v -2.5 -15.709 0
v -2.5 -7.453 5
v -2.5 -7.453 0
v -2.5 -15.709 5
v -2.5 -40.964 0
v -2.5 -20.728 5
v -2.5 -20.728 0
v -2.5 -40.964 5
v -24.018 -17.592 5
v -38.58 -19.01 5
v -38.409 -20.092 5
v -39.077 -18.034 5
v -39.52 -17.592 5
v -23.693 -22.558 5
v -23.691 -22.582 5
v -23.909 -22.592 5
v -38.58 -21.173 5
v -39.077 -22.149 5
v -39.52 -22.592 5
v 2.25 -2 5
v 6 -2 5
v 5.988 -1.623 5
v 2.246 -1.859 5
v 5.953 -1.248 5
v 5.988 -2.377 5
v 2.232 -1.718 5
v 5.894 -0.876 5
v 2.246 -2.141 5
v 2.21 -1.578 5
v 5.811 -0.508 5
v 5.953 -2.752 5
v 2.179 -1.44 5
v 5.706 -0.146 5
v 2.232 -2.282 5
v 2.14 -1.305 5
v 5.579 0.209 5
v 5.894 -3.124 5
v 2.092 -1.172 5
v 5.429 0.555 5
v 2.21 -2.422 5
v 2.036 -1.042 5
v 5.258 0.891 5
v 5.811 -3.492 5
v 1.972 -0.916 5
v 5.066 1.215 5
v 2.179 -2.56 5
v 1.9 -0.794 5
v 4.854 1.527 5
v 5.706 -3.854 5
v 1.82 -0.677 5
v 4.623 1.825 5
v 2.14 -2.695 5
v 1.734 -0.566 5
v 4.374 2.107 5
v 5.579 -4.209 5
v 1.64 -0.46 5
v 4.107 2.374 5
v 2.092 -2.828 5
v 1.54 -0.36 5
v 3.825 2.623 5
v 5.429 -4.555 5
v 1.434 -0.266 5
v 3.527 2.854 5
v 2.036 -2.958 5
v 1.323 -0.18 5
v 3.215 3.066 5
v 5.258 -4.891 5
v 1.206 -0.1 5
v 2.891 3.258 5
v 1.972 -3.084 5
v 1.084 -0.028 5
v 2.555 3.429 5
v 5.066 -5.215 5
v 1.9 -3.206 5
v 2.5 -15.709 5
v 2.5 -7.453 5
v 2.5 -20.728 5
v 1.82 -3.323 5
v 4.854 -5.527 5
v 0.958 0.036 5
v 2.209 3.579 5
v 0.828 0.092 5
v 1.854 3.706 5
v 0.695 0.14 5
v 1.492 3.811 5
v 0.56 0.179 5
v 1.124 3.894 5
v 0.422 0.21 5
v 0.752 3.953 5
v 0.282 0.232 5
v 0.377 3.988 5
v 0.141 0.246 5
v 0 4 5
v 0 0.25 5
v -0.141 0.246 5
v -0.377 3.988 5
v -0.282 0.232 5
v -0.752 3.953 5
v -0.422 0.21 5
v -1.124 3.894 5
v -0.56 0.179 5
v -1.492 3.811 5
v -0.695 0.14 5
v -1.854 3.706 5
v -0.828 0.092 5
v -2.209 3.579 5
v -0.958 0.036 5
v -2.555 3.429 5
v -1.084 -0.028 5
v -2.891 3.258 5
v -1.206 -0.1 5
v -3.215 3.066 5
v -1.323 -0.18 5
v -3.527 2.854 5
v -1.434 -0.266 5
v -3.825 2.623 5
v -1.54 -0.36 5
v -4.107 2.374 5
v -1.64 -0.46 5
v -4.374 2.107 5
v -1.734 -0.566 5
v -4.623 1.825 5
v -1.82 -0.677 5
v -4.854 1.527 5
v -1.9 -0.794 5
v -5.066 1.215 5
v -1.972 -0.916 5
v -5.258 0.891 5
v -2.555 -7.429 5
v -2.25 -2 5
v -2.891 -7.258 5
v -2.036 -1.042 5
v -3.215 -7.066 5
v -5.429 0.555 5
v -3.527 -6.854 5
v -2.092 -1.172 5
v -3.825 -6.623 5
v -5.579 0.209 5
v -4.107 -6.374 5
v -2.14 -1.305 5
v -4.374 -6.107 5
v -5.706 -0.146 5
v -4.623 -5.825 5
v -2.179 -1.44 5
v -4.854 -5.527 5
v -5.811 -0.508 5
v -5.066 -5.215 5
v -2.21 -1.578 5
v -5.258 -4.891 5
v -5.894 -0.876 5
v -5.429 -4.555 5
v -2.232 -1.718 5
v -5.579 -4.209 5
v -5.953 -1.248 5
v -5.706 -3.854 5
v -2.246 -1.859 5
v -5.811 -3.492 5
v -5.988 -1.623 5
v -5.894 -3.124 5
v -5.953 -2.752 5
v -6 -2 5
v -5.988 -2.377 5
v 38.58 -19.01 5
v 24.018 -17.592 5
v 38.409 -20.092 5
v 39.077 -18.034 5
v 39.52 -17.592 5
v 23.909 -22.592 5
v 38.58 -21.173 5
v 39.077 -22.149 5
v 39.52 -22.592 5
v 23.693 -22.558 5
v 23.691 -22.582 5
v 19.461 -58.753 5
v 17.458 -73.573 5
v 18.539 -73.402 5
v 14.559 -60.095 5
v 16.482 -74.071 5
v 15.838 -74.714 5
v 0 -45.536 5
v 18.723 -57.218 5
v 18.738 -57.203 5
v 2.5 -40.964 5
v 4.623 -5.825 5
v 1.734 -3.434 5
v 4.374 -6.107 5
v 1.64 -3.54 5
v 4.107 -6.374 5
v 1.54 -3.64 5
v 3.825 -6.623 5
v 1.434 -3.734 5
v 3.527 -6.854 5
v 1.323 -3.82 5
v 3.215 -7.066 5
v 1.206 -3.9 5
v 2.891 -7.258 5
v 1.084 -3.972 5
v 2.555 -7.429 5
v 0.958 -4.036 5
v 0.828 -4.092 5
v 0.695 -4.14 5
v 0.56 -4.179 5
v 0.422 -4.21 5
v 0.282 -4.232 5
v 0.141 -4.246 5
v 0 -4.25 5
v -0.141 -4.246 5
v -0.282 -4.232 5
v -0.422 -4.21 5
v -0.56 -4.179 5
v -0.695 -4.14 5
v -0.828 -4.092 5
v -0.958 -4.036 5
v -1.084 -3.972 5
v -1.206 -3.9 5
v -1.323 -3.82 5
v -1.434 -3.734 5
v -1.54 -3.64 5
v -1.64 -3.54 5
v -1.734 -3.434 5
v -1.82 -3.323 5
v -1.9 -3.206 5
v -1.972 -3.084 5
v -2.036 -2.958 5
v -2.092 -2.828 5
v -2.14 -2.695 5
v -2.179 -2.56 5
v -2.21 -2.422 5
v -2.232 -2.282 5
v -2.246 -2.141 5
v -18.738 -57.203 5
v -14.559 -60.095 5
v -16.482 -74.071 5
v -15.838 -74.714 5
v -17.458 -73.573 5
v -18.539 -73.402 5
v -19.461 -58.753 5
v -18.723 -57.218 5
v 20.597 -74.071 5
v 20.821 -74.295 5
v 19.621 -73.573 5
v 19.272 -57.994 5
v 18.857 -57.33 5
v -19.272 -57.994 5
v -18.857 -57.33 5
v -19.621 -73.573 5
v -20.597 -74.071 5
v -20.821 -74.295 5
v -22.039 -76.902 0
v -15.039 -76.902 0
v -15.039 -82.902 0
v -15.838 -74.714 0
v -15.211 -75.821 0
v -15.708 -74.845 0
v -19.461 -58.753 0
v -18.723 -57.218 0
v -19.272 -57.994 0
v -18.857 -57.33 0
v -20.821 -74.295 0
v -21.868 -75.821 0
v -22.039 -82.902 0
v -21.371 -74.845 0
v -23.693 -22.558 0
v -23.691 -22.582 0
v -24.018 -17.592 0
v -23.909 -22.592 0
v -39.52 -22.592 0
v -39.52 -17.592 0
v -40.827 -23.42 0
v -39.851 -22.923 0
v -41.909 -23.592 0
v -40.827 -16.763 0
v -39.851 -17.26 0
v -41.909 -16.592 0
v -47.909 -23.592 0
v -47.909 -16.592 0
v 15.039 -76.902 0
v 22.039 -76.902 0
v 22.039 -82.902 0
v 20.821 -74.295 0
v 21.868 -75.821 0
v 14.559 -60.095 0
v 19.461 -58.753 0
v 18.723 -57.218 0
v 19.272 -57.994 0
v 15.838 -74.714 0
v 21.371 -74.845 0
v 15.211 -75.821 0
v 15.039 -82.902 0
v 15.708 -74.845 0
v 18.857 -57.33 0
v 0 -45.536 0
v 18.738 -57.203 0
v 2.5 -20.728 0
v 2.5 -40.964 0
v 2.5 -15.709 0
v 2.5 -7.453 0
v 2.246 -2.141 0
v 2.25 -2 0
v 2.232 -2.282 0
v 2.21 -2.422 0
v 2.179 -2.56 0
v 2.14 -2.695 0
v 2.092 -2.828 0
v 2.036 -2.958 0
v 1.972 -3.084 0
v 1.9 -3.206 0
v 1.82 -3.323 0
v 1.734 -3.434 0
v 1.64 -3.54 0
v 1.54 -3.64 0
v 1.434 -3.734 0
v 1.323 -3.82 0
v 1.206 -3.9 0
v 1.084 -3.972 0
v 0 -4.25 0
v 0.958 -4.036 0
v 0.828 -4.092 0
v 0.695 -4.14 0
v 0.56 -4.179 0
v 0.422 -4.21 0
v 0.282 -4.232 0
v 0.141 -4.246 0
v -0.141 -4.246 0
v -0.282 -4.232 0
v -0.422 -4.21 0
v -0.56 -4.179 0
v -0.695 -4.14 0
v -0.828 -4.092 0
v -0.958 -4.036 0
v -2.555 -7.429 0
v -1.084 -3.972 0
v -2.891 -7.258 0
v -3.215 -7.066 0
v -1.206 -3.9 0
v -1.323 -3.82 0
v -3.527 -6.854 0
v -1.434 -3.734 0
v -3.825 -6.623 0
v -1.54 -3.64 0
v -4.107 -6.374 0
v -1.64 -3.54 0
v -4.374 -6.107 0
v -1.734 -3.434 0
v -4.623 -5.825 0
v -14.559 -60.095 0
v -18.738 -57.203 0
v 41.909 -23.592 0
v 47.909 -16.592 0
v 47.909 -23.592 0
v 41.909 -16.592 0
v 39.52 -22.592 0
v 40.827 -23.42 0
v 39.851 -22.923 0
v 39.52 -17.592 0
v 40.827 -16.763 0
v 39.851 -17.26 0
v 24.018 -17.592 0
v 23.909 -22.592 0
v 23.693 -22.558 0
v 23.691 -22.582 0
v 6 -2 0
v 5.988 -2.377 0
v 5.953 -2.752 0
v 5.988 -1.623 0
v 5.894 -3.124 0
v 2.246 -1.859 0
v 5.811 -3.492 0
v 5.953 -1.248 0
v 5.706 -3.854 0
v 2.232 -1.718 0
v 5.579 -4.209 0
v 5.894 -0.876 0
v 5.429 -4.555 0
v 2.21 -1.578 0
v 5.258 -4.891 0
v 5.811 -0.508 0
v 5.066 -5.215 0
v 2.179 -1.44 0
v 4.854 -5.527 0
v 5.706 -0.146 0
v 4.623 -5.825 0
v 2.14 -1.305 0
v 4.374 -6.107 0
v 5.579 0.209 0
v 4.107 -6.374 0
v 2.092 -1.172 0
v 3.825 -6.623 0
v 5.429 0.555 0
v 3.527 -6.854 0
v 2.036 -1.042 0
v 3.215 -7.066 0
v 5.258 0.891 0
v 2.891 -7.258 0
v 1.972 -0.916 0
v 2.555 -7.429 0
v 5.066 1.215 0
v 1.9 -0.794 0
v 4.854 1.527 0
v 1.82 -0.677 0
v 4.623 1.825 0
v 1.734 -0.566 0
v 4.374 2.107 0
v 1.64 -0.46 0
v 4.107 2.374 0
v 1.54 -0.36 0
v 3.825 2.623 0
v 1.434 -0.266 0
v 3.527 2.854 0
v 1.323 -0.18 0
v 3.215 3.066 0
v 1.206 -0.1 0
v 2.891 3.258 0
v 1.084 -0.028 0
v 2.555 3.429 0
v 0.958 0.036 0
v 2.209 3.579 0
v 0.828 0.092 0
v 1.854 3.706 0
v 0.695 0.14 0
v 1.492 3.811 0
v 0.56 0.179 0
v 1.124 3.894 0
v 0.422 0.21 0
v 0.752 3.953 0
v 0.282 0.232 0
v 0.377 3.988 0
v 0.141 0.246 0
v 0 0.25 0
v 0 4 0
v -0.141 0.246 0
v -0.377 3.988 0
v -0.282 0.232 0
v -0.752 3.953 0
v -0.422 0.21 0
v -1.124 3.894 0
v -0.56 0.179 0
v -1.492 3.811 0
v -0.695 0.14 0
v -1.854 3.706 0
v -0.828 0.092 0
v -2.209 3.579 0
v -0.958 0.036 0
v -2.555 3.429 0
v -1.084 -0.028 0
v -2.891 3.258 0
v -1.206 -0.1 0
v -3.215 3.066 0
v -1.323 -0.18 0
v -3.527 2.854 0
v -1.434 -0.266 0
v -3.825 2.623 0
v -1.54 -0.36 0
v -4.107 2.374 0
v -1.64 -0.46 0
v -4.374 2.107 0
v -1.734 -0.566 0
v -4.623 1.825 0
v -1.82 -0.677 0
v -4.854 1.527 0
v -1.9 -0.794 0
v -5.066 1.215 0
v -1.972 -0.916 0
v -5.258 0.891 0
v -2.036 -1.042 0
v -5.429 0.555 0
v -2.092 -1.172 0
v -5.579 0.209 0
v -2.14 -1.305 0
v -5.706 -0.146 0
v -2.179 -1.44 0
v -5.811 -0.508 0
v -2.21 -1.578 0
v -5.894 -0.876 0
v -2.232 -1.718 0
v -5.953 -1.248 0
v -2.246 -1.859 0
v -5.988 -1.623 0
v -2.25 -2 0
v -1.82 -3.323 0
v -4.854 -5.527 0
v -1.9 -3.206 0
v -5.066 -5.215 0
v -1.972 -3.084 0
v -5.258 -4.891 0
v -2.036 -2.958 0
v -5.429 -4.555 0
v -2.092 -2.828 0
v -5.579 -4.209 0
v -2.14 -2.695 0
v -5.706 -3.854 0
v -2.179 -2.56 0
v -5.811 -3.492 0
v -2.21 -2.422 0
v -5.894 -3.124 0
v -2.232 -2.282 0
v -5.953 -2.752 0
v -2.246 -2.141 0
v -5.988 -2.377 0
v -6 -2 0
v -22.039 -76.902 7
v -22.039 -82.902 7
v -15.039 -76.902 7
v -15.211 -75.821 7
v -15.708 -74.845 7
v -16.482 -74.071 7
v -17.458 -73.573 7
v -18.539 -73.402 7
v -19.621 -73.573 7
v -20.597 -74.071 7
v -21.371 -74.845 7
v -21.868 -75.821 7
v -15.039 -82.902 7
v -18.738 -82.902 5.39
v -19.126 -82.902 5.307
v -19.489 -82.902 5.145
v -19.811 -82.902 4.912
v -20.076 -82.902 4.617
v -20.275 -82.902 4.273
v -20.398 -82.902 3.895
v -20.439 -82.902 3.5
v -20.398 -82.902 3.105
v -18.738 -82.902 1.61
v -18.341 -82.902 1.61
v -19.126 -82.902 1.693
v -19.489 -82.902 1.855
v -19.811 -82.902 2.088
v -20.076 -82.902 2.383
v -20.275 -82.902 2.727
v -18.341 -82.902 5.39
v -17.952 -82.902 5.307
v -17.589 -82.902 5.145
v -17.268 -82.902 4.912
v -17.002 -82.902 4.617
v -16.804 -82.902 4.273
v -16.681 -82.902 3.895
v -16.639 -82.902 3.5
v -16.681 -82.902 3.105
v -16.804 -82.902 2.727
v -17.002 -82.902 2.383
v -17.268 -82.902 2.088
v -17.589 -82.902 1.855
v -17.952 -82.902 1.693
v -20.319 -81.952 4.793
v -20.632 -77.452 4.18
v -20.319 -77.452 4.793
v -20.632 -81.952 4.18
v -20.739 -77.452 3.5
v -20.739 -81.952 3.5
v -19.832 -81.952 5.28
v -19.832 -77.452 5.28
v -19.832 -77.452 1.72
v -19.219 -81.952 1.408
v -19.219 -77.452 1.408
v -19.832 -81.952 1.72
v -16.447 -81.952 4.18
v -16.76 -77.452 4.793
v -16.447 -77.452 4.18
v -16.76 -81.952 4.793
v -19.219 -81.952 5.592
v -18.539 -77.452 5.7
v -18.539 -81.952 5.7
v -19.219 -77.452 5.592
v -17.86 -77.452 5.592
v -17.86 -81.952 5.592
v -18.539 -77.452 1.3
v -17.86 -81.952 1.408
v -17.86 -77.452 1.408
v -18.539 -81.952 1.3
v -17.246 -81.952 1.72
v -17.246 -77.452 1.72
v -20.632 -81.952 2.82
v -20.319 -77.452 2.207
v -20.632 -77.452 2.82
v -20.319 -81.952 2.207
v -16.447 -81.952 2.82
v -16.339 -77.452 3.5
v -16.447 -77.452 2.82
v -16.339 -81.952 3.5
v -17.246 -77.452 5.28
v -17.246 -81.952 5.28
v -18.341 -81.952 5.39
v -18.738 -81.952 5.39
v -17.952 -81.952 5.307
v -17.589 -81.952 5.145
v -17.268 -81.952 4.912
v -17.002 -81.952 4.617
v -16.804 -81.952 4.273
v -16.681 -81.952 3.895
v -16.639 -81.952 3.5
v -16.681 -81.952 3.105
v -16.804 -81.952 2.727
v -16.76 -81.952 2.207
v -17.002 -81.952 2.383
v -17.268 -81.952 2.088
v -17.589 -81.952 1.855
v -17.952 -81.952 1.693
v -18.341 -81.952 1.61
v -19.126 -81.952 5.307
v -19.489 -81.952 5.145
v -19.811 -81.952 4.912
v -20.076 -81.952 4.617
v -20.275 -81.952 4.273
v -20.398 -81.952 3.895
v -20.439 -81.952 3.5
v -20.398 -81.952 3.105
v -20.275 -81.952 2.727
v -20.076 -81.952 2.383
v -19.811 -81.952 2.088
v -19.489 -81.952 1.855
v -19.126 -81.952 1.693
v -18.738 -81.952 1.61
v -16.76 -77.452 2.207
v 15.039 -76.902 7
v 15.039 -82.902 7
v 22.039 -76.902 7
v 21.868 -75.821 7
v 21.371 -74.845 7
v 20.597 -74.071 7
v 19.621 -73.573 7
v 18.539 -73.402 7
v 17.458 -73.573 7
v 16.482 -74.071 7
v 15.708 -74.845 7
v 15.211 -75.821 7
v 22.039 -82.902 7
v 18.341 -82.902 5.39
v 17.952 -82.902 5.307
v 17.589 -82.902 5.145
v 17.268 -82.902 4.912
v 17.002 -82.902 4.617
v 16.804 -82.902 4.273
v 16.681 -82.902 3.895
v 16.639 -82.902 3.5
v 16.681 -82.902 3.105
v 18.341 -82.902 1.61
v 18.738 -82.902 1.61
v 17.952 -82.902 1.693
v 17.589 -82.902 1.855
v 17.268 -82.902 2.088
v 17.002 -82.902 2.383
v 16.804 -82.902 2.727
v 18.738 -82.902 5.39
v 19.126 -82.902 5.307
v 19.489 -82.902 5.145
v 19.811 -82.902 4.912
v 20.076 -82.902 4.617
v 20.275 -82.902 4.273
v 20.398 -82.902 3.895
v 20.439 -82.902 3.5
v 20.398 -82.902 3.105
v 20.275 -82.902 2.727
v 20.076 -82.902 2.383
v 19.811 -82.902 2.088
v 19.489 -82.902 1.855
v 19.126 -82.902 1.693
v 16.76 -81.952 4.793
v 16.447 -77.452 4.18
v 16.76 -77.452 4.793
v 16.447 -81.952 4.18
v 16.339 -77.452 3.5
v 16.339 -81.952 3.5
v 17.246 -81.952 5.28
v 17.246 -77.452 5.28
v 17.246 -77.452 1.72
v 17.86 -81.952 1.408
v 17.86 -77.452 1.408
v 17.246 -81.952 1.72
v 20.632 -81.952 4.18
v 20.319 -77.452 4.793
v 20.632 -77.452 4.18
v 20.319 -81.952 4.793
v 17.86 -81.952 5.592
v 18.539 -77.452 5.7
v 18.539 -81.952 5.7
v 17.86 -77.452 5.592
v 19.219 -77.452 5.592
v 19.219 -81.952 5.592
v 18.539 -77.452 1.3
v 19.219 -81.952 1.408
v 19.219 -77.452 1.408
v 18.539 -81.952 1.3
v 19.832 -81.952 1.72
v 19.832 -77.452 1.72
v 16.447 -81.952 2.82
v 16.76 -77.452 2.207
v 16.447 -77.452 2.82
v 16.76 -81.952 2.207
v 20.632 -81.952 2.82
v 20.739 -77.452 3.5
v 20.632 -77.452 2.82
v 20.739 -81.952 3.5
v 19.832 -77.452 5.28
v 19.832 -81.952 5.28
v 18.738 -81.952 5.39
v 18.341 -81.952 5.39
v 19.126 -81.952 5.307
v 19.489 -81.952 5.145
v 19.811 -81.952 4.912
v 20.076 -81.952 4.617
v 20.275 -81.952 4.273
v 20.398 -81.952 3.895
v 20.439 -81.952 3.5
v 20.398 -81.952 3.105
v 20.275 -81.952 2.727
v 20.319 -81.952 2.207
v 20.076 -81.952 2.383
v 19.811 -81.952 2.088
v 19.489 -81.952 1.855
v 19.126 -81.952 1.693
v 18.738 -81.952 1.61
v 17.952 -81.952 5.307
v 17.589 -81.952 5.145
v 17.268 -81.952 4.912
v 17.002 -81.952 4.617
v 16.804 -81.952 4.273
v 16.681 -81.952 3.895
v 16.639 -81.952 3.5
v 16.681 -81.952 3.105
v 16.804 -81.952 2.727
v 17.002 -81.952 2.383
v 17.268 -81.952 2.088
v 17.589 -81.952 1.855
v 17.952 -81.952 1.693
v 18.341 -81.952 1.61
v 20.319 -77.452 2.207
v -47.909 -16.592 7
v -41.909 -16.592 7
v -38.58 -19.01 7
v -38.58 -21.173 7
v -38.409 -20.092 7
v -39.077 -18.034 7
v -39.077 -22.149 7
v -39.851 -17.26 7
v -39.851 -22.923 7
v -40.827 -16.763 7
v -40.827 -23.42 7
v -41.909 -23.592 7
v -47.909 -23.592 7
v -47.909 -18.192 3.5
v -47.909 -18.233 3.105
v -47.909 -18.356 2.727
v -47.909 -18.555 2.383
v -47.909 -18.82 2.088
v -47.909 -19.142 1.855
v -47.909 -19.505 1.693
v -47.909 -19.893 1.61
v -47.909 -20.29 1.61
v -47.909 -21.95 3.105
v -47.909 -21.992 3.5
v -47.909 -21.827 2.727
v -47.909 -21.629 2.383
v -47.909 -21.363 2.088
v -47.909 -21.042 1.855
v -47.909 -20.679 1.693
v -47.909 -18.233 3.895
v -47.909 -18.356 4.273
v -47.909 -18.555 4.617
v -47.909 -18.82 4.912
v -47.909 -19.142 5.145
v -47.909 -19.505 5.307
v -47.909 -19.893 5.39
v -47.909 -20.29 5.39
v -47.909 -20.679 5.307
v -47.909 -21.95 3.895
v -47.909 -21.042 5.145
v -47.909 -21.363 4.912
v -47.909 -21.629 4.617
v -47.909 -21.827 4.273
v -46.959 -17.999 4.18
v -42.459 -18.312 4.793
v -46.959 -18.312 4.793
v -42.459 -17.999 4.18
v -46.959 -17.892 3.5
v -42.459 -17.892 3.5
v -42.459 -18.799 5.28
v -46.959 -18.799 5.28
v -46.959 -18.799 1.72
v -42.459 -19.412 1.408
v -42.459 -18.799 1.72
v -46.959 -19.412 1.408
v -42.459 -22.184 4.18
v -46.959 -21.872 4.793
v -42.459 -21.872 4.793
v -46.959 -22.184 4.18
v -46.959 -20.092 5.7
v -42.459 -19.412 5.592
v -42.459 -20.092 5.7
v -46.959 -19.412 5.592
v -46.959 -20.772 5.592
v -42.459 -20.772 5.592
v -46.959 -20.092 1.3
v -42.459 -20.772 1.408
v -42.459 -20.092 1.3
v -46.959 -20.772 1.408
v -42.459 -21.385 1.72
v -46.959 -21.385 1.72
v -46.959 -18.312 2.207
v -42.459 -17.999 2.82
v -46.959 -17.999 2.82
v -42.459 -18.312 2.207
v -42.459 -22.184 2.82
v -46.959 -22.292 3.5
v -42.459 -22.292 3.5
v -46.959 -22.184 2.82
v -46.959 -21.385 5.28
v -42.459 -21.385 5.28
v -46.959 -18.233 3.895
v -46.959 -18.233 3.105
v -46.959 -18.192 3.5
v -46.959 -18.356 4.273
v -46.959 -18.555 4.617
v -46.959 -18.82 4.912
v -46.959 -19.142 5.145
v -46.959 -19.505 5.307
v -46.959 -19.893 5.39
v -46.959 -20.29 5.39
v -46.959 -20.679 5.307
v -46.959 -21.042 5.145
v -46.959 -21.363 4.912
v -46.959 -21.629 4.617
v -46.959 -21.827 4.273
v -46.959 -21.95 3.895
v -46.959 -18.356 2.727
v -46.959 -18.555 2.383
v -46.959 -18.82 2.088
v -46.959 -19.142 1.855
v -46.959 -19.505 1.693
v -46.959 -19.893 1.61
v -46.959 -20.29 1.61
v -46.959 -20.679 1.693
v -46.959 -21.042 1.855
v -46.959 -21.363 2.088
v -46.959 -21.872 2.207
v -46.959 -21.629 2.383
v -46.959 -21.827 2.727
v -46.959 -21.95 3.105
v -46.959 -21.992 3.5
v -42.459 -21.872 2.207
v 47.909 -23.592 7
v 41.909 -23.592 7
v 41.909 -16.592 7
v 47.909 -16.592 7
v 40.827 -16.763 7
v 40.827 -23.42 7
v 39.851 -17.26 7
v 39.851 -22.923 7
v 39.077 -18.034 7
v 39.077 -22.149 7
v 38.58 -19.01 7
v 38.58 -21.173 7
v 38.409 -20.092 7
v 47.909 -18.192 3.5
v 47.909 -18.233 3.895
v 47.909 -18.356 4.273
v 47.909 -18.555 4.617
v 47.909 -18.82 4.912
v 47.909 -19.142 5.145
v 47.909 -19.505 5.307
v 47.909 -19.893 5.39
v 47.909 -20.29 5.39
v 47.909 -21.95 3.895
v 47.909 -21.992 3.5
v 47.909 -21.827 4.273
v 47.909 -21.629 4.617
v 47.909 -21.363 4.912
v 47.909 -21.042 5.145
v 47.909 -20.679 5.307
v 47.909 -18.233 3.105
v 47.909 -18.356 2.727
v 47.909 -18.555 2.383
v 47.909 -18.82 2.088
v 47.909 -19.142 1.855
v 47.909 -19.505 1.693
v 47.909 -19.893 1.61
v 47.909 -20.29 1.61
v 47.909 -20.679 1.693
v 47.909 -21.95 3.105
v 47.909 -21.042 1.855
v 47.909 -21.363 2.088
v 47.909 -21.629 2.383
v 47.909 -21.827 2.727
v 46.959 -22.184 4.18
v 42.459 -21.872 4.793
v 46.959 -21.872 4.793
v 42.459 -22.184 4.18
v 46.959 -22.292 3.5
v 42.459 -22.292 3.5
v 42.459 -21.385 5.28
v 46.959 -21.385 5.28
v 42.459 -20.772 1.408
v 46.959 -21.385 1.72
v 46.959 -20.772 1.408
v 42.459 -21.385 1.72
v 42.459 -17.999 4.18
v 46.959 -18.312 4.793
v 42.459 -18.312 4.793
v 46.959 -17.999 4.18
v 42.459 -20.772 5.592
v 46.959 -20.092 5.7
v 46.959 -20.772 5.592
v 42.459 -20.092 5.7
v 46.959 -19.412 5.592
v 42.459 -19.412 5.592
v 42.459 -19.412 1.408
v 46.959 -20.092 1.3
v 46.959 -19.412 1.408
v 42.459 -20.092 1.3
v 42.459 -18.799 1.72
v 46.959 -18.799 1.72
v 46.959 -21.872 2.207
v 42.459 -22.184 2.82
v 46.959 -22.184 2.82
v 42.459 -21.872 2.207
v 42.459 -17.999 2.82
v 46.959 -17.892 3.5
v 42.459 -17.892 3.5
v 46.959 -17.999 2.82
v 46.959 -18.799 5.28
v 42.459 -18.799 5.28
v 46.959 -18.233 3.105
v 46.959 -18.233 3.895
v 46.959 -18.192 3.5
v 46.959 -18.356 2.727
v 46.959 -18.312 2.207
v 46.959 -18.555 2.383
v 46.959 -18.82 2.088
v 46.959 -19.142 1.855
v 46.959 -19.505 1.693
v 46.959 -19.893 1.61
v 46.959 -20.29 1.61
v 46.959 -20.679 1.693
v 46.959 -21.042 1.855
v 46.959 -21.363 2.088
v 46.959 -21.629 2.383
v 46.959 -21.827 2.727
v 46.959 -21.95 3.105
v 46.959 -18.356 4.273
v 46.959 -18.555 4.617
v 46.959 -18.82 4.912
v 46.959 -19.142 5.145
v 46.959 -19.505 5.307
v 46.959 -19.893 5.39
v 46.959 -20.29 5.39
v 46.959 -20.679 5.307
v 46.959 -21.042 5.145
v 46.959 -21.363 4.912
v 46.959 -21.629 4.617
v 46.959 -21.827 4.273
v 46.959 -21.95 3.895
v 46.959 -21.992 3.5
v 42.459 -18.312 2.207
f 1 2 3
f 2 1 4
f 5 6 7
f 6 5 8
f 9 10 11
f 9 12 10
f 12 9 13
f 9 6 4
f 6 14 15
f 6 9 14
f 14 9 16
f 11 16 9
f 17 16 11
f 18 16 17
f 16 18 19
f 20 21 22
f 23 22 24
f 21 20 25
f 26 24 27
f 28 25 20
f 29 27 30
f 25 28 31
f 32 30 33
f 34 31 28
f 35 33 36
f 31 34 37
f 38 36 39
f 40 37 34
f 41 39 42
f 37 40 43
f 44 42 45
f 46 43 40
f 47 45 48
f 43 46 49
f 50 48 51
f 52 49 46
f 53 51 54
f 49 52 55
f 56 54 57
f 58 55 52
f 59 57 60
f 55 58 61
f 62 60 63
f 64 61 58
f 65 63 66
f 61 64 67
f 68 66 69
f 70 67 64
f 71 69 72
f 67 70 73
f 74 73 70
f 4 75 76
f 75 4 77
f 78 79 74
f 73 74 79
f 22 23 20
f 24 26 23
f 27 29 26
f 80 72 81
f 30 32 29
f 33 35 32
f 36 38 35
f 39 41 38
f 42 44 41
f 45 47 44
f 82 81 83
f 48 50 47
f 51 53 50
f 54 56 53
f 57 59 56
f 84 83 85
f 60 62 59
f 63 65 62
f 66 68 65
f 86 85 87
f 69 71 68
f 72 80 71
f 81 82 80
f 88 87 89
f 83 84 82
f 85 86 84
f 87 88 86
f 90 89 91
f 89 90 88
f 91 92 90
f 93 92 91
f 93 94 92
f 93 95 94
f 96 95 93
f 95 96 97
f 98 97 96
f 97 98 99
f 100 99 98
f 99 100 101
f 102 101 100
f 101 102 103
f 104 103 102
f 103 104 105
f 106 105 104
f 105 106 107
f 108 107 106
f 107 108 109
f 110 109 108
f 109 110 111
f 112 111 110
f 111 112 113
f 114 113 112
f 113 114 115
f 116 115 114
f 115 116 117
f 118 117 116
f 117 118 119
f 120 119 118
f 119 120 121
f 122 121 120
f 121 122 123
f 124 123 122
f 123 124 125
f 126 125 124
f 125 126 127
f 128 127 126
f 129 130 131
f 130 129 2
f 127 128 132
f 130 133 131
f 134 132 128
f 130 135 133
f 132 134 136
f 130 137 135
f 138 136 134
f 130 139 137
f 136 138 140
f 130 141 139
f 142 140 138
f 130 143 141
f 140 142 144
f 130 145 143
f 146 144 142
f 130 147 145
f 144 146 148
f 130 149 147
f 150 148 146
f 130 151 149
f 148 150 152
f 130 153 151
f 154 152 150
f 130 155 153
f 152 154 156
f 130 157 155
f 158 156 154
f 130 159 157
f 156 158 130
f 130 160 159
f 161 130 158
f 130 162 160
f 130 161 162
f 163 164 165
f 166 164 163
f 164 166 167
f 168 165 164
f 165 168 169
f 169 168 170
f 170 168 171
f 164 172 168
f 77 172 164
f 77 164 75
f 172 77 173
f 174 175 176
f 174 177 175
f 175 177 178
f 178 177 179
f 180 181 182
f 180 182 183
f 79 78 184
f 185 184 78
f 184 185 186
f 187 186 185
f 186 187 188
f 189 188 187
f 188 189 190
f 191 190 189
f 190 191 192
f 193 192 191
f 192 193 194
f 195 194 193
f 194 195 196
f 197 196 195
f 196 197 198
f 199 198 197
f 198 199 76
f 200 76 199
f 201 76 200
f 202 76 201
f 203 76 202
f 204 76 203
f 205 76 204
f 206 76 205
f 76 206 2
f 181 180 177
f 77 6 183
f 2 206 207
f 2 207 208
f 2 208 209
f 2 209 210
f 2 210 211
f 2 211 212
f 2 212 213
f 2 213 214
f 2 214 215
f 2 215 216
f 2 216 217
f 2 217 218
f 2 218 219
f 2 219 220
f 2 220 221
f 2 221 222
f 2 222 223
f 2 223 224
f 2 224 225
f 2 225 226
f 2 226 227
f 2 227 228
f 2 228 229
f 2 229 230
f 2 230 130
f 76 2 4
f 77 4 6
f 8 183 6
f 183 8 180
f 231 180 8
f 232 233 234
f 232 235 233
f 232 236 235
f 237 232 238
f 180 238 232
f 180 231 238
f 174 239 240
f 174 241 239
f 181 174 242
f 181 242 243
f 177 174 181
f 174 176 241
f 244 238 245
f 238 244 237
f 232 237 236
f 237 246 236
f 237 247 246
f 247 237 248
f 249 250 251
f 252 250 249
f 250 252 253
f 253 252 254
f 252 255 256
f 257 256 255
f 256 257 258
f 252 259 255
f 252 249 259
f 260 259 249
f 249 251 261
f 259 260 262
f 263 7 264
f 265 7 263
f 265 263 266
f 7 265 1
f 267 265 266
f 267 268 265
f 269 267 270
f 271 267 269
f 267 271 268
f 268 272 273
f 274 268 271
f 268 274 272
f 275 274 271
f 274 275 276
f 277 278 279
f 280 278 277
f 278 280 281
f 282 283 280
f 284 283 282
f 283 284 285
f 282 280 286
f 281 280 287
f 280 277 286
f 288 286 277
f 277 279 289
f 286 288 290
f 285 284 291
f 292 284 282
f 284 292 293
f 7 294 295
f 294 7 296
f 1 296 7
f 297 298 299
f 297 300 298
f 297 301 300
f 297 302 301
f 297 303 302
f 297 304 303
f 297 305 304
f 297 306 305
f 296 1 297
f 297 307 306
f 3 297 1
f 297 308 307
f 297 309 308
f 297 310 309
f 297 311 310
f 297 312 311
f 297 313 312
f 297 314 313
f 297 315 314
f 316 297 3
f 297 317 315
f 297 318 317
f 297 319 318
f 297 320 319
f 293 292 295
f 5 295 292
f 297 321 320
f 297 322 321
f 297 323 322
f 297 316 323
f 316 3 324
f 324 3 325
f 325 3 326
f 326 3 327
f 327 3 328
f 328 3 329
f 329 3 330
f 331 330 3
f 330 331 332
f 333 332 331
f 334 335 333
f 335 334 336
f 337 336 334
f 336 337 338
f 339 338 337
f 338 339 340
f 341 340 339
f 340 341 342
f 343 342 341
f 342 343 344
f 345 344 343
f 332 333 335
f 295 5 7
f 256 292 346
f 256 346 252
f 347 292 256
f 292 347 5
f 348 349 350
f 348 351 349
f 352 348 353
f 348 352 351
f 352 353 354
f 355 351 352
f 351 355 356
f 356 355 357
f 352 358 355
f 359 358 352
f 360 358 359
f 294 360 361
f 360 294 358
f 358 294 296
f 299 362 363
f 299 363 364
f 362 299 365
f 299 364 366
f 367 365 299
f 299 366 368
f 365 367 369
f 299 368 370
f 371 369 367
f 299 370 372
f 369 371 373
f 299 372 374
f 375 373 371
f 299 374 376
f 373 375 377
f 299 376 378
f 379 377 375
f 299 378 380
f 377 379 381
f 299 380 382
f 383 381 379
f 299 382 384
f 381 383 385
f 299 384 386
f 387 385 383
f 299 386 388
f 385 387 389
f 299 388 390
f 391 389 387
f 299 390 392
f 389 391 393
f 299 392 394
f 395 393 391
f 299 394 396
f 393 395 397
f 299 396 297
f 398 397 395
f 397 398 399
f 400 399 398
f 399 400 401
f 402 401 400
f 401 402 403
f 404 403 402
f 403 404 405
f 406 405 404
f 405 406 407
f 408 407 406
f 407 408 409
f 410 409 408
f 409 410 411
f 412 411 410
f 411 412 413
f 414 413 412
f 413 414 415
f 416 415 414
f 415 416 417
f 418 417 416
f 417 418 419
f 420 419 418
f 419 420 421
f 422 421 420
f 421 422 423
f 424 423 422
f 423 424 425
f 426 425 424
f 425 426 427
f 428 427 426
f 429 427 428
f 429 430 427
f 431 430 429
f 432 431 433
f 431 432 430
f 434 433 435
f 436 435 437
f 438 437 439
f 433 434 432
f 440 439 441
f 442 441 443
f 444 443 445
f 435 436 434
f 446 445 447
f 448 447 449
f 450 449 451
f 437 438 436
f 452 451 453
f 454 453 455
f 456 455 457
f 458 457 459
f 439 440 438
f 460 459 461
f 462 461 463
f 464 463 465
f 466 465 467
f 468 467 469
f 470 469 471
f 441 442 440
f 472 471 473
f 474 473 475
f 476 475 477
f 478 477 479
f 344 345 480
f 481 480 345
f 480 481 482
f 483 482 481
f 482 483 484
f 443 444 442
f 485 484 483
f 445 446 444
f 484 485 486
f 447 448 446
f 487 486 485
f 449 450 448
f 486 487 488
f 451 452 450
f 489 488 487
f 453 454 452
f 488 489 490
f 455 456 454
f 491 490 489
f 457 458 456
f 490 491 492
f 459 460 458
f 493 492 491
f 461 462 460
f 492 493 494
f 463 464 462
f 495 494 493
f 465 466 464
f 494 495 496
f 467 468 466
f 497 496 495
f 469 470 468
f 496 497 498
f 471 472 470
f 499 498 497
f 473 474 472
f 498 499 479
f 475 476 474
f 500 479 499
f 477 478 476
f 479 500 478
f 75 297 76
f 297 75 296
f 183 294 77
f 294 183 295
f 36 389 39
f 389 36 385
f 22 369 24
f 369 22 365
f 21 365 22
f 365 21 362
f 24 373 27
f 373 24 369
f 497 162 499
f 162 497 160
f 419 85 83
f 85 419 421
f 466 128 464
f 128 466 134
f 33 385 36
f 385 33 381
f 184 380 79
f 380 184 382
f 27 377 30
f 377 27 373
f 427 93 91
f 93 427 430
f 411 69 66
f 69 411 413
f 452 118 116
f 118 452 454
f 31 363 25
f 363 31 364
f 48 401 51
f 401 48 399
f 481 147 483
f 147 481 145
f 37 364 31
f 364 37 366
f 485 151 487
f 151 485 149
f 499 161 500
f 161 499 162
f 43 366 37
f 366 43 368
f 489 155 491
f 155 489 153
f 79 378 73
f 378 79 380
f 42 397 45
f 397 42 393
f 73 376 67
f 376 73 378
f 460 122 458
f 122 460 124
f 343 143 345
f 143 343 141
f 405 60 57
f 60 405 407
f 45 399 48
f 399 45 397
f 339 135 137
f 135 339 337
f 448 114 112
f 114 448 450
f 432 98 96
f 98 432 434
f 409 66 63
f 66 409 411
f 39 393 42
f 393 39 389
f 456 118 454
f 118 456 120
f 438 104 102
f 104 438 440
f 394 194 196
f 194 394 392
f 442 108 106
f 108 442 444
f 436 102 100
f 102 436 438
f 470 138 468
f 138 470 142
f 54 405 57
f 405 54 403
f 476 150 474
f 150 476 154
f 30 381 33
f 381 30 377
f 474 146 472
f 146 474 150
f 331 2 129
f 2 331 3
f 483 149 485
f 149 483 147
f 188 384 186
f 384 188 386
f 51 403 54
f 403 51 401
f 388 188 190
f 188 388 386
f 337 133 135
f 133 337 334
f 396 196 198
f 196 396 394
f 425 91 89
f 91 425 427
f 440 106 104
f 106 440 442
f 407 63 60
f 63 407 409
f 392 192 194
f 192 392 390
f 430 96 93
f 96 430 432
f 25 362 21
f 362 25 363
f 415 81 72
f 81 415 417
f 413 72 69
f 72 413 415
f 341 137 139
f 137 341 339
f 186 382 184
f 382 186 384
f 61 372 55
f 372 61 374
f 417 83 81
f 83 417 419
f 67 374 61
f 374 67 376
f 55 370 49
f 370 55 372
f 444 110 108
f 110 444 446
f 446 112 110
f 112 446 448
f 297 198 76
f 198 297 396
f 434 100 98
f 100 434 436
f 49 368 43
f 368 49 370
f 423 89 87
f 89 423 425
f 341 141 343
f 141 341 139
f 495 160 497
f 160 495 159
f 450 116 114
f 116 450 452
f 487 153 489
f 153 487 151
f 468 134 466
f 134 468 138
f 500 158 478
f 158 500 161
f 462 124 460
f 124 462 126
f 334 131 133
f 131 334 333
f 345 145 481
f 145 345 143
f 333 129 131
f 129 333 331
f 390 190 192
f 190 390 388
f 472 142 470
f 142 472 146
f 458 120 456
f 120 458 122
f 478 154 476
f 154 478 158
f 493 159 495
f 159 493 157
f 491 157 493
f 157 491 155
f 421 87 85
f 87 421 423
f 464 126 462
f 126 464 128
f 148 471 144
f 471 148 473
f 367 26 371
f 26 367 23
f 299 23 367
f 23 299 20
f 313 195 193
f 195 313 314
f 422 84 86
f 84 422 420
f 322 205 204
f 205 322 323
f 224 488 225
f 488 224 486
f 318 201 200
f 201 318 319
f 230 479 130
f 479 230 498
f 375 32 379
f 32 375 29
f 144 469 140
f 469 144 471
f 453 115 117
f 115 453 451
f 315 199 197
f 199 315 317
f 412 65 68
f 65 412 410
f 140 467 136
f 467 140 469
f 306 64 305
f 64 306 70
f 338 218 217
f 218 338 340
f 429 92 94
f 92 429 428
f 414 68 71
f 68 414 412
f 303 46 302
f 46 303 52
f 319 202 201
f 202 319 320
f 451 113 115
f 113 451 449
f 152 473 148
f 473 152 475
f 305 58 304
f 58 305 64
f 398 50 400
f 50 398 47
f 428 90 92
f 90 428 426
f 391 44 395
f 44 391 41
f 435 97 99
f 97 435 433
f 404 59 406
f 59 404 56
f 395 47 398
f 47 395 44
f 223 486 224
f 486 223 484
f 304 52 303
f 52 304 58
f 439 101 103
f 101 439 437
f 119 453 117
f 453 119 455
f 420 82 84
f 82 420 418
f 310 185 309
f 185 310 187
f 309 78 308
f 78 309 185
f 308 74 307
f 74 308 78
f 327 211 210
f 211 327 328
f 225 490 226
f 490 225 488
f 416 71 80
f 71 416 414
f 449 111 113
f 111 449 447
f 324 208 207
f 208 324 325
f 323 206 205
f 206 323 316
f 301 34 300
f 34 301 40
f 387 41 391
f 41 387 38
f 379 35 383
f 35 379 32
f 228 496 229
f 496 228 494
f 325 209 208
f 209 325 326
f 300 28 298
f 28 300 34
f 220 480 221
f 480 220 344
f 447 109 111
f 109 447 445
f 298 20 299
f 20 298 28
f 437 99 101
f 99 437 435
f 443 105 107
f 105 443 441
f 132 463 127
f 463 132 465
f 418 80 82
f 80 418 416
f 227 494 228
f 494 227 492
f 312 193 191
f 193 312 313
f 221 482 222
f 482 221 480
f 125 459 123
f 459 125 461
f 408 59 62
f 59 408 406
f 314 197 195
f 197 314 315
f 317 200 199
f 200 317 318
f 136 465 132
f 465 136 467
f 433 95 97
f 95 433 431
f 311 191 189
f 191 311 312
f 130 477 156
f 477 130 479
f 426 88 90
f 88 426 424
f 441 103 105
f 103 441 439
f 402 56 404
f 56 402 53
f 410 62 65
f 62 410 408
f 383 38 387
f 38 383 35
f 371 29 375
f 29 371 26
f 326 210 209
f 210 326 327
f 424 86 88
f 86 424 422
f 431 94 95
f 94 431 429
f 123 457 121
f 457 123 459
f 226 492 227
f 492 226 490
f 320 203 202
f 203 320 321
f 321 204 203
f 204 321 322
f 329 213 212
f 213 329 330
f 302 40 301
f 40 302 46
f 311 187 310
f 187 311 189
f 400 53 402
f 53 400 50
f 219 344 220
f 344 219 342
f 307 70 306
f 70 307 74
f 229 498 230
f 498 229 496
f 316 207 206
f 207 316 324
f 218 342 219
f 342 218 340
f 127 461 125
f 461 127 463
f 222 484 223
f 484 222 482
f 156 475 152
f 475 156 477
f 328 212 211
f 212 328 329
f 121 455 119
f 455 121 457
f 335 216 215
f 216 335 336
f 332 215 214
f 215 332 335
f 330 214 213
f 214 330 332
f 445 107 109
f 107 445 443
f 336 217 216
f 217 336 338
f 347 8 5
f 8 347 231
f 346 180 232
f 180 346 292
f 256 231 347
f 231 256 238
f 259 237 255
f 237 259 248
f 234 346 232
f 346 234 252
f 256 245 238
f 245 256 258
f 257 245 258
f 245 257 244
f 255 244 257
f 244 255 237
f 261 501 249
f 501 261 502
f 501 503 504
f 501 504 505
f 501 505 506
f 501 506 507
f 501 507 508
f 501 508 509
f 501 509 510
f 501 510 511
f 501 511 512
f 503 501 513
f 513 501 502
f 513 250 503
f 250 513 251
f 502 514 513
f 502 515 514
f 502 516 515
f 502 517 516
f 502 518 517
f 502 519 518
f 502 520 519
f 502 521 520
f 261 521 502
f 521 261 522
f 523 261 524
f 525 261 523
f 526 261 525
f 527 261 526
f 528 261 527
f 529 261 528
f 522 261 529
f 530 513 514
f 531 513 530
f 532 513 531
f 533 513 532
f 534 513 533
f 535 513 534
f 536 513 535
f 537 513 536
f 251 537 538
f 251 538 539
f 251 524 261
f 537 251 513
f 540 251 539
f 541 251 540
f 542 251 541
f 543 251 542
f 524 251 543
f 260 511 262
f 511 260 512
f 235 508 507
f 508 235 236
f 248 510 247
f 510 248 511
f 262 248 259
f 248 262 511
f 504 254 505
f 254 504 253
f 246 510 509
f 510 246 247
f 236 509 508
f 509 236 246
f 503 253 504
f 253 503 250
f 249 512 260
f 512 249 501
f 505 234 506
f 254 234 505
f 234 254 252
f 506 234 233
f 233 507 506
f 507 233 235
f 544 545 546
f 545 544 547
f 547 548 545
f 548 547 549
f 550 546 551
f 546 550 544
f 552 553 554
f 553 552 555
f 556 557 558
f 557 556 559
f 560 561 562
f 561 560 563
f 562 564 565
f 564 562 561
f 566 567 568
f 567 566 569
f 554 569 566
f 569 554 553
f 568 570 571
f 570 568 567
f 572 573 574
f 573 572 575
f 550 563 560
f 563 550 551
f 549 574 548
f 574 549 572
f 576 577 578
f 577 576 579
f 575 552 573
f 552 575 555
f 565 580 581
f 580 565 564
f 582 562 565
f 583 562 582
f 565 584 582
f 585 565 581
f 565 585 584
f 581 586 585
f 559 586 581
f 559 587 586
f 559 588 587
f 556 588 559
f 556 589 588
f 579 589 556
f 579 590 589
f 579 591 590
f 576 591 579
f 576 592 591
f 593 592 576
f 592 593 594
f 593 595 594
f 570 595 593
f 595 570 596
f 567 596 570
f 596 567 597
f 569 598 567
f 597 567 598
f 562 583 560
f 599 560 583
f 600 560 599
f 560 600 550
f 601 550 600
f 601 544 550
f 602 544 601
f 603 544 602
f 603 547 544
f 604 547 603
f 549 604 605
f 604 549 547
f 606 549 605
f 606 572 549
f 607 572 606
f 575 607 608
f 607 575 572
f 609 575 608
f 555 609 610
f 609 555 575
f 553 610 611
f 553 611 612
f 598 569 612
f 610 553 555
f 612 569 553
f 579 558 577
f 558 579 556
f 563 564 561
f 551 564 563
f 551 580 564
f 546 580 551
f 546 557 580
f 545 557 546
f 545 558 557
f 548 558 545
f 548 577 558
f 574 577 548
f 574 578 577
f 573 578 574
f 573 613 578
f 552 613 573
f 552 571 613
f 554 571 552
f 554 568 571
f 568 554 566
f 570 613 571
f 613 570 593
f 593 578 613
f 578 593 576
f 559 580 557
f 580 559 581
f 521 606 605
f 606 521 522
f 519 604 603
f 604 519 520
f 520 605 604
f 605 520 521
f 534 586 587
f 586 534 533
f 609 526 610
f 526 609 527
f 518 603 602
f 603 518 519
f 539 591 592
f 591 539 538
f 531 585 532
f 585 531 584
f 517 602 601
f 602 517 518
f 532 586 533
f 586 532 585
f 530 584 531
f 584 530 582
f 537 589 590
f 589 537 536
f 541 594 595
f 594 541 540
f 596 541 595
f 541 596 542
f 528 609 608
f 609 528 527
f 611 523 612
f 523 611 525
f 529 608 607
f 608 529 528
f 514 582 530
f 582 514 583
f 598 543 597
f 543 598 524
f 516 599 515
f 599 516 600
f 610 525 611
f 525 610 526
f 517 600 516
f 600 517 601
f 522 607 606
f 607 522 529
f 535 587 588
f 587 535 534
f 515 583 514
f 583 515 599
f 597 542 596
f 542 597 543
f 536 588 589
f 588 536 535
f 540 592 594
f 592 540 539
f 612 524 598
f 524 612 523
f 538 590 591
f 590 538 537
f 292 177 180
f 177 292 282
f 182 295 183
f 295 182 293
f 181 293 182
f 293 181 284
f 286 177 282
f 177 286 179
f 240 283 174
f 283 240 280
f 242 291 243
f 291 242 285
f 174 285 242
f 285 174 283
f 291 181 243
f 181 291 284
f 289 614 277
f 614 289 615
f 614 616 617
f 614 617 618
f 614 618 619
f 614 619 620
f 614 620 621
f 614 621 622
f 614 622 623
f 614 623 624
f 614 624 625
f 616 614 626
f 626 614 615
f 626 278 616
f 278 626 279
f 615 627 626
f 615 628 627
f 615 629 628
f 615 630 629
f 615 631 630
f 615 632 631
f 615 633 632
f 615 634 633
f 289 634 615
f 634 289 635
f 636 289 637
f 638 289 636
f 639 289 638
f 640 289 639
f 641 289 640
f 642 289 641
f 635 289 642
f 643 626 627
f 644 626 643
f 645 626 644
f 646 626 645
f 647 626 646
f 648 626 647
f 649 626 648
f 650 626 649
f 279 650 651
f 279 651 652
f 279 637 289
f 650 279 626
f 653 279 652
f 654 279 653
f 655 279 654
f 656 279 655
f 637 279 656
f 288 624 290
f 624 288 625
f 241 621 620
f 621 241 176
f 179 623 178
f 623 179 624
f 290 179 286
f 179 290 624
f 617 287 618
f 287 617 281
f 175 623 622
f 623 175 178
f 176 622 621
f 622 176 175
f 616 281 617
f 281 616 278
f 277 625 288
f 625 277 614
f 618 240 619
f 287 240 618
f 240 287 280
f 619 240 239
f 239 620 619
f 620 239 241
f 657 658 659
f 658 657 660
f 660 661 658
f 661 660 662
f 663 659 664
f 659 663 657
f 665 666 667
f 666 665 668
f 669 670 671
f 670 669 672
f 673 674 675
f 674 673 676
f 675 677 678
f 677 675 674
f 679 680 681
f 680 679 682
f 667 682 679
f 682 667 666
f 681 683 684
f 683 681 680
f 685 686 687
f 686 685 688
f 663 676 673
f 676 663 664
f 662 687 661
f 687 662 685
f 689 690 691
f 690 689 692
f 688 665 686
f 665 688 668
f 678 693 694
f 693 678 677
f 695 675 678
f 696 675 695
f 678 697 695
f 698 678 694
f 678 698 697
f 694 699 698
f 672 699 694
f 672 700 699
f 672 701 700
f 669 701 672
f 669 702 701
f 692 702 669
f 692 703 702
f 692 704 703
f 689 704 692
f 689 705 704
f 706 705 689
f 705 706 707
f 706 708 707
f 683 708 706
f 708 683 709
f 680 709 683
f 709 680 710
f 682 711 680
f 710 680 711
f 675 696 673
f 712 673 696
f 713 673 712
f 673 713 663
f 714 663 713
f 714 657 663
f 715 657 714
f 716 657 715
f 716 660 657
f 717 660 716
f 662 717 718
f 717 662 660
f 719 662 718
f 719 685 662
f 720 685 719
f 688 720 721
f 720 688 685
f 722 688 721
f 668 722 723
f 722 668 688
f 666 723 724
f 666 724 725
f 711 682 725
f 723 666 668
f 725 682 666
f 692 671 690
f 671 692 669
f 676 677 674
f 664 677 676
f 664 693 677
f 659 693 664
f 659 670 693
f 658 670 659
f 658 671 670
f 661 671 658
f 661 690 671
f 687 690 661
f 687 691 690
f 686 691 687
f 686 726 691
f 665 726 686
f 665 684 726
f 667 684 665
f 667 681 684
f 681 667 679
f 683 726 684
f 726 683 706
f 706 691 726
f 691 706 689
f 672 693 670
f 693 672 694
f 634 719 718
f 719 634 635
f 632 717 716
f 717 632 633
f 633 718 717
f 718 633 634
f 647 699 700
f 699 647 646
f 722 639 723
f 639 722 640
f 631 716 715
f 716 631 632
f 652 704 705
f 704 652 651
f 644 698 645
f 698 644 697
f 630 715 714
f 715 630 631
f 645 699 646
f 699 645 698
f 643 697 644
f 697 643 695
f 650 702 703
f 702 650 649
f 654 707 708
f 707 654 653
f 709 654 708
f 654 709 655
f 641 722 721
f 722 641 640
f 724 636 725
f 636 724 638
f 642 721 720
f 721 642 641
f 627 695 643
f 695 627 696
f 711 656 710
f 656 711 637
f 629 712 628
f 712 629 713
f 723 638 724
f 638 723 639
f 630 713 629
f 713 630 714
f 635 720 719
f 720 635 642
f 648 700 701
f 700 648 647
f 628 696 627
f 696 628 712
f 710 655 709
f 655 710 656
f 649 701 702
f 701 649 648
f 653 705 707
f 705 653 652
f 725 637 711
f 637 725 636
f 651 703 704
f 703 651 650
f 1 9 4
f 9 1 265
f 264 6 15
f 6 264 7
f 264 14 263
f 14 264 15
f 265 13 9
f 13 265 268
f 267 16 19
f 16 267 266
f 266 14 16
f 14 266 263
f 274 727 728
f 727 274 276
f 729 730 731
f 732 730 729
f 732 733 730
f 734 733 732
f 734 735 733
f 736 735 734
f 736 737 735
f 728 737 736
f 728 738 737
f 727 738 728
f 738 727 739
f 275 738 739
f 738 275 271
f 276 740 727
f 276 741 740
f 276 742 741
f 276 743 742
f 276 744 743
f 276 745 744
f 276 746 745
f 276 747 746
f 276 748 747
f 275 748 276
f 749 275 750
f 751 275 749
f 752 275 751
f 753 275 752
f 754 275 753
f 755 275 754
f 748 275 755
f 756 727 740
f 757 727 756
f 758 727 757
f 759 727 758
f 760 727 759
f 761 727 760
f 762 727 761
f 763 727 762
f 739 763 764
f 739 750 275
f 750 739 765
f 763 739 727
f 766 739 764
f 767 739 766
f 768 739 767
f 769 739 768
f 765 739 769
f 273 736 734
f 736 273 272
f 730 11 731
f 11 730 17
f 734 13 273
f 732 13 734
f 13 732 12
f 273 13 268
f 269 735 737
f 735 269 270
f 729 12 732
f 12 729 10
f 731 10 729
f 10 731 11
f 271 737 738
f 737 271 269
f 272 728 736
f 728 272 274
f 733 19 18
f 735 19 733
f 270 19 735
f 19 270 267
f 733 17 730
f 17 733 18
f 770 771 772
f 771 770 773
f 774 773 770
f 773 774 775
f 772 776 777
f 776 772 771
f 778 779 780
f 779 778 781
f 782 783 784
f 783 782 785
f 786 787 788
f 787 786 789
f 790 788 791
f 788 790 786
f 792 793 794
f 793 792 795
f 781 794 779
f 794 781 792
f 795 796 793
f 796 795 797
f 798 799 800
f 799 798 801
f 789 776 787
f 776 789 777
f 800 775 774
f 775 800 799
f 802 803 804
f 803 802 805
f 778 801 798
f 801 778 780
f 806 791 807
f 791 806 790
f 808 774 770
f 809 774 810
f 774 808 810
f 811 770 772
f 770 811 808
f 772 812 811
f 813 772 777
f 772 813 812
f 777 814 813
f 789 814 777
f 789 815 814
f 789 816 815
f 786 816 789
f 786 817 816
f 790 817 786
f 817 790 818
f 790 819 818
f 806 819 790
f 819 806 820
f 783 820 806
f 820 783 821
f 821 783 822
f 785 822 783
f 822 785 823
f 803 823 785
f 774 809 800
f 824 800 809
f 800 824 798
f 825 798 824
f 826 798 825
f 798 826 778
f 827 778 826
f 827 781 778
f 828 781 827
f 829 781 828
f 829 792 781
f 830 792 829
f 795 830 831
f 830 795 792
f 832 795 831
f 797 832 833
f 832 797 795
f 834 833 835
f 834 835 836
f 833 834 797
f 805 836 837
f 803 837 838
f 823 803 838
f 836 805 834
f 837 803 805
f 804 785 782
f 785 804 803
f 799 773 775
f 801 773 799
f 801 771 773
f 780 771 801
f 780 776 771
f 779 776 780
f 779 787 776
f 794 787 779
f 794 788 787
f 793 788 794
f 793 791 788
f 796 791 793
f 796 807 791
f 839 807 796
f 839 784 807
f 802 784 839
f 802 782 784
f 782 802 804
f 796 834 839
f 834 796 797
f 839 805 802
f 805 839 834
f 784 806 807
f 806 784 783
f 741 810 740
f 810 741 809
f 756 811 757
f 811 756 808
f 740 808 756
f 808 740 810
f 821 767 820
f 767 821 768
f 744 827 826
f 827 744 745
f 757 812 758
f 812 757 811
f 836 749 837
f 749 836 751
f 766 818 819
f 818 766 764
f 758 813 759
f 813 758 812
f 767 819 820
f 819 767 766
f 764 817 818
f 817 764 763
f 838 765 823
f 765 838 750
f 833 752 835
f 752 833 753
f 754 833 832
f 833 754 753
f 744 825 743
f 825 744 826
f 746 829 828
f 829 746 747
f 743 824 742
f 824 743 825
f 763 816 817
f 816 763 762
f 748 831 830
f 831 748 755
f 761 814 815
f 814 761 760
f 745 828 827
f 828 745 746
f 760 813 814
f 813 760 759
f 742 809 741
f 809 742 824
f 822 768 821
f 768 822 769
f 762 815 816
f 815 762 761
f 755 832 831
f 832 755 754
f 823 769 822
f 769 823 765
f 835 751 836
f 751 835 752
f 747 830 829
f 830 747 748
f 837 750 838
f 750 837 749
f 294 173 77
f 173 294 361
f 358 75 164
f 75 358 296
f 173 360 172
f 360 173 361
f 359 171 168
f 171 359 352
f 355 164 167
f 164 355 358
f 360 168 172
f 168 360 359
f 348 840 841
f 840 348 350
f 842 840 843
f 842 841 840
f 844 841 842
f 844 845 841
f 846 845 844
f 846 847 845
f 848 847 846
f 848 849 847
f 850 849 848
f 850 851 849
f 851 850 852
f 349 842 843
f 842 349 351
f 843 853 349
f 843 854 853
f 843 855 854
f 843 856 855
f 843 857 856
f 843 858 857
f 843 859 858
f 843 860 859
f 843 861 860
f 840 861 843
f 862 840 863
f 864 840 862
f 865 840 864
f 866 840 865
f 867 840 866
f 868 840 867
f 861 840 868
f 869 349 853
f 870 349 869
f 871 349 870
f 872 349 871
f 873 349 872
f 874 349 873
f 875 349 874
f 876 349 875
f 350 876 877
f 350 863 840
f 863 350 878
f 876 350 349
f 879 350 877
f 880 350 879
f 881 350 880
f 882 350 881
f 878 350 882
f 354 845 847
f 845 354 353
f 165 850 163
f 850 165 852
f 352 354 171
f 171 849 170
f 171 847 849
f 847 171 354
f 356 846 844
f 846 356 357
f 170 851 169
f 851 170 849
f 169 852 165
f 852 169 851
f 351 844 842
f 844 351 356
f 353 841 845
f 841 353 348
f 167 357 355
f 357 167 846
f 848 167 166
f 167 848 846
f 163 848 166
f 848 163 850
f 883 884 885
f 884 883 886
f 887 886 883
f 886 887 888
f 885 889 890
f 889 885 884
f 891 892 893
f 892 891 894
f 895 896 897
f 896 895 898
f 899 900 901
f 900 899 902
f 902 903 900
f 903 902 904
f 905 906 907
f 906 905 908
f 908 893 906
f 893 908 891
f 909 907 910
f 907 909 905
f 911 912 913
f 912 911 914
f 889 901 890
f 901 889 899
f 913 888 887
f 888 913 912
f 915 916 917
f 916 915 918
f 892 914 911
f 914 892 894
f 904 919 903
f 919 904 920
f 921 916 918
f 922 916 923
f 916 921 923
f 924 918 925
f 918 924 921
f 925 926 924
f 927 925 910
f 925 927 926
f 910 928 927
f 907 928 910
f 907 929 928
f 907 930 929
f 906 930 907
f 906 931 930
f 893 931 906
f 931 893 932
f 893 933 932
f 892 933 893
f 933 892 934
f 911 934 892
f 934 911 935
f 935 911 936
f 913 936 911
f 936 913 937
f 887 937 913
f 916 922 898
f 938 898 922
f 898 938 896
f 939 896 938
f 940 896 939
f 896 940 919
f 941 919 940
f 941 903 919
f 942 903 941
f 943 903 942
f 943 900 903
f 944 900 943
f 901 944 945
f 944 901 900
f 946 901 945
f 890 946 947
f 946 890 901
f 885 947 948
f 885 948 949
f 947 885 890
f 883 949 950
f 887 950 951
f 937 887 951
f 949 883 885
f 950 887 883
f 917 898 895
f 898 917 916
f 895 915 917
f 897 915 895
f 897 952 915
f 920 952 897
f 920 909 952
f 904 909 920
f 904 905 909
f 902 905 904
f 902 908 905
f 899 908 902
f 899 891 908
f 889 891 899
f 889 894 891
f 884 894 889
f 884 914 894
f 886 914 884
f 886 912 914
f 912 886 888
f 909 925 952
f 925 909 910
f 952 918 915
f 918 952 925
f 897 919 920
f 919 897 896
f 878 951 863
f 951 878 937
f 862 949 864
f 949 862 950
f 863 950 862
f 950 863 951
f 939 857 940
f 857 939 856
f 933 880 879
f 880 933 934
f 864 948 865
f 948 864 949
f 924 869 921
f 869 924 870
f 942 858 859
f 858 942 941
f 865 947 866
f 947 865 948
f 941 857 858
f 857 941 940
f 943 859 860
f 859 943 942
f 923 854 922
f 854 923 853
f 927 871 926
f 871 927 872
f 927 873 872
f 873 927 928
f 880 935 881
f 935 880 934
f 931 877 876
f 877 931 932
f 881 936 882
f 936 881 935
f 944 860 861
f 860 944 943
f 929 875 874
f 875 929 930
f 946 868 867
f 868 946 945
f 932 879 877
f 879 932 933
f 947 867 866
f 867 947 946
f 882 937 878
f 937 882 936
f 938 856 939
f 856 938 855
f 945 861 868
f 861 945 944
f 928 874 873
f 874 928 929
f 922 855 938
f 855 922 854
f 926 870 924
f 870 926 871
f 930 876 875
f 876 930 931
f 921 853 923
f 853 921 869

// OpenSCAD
// ==================================================
// Stick Man - Customizer
// Created by Daiju Watanbe ( Daizyu ).
// 2 April 2016. 
// =================================================

/* MODIFIED VERSION BY Daniel K. Schneider
   January 2017
   - removed base
   - changed default parameters
   - added holes in feet and hands to insert 5x5mm cylindrical magnets
   
   Tips: 
   - The sum of each arm or foot limb angles should be 180.
   - Magnet diameter should be a bit smaller than the magnet if printed with TPE
   - magnet_entry_extra_width = -0.6; and magnet_entry_extra_height = 1; // add a bottle neck
   - Set the magnet_entry_extra_* values to zero if you plan to glue the magnet.
*/

// preview[view:south, tilt:top]

/* [Angle] */
upper_arm_l = -85;               // [-360:360]
lower_arm_l = -5;               // [-360:360]
hand_l = -0;               // [-360:360]
upper_arm_r = 85;               // [-360:360]
lower_arm_r = 5;               // [-360:360]
hand_r = 0;               // [-360:360]
thigh_l = -45;               // [-360:360]
shin_l = 40;               // [-360:360]
foot_l = 5;               // [-360:360]
thigh_r = 45;               // [-360:360]
shin_r = -40;               // [-360:360]
foot_r = -5;               // [-360:360]
body = 0;               // [-360:360]


/* [Basic] */
b_thickness = 5;
thickness = 5;

/* [Magnet holes] */
magnet_diameter = 4.4;
magnet_entry_extra_width = -0.6; // [-1:0]
magnet_entry_extra_height = 1; // [0:1]
magnet_height = 4; // [1:5]

/* [Head] */
fill_head = false;
head_diameter = 12;
head_offset_x = 0;
head_offset_y = -2;
head_hole_diameter = 4.5;

/* [Body] */
body_length = 36;

/* [Left arm] */
arm_l_offset = 12;
upper_arm_l_length = 24;
lower_arm_l_length = 18;
hand_l_length = 6;

/* [Right arm] */
arm_r_offset = 12;
upper_arm_r_length = 24;
lower_arm_r_length = 18;
hand_r_length = 6;

/* [Left Leg] */
thigh_l_length = 24;
shin_l_length = 18;
foot_l_length = 6;

/* [Right Leg] */
thigh_r_length = 24;
shin_r_length = 18;
foot_r_length = 6;

/* [Legs and hands] */
paw_extra_width = 2;
paw_extra_height = 2;

/* [resolution] */
base_fn = 120;
head_fn = 100;

module bone(length){
     {
	  translate([-thickness/2,0,0])
	       cube(size = [thickness,length,b_thickness], center = false);
     }
     cylinder(h=b_thickness, r=thickness/2, center=false ,$fn=20);
}

module handFootBone(length){
     {
	  difference () {
	       union () {
		    translate([-(thickness+paw_extra_width)/2,0,0])
			 cube(size = [thickness+paw_extra_width,length,b_thickness+paw_extra_width], center = false);
		    cylinder(h=b_thickness+paw_extra_width, r=(thickness+paw_extra_width)/2, center=false ,$fn=20);
	       }
	       // magnet hole
	       translate ([0,length-magnet_entry_extra_height+0.05,(b_thickness+paw_extra_width)/2])
		    rotate ([90,0,0])
		    cylinder(h=magnet_height+0.5, r=magnet_diameter/2, center=false ,$fn=20);
               // bottleneck at entry
	       translate ([0,length+0.05,(b_thickness+paw_extra_width)/2])
		    rotate ([90,0,0])
		    cylinder(h=magnet_entry_extra_height+0.05, r=(magnet_diameter + magnet_entry_extra_width)/2, center=false ,$fn=30);
	  }
     }
}

module branch(
     head_diameter,
     Degrees1,Length1,
     Degrees2,length2,
     Degrees3,length3,
     Degrees4,length4,
     )
{
     rotate(Degrees1,[0,0,1])
	  translate([0,Length1+head_diameter/2,0])
	  rotate(Degrees2,[0,0,1])
     {
	  bone(length2);

	  translate([0,length2,0])
	       rotate(Degrees3,[0,0,1])
	  {
	       bone(length3);

	       translate([0,length3,0])
		    rotate(Degrees4,[0,0,1])
	       {
		    handFootBone(length4);
	       }
	  }
     }
}

module headBody() {
     union(){
	  translate([head_offset_x,head_offset_y,0])
	       cylinder(h=b_thickness, r=head_diameter/2.0, center=false ,$fn=head_fn);
	  rotate(body+180,[0,0,1])
	       bone(body_length+head_diameter/2);	
     }
}

union()
{
     if ( fill_head ) 
     {
	  headBody();
     }else{
	  difference()
	  {
	       headBody();
	       translate([head_offset_x,head_offset_y,-1])
		    cylinder(h=b_thickness+2, r=head_hole_diameter/2, center=false ,$fn=head_fn);
	  }
     }
     
     branch(head_diameter,
	    body+180,body_length,
	    thigh_l,thigh_l_length,
	    shin_l,shin_l_length,
	    foot_l,foot_l_length
	  );
     
     branch(head_diameter,
	    body+180,body_length,
	    thigh_r,thigh_r_length,
	    shin_r,shin_r_length,
	    foot_r,foot_r_length
	  );

     branch(head_diameter,
	    body+180,arm_l_offset,
	    upper_arm_l,upper_arm_l_length,
	    lower_arm_l,lower_arm_l_length,
	    hand_l,hand_l_length
	  );

     branch(head_diameter,
	    body+180,arm_r_offset,
	    upper_arm_r,upper_arm_r_length,
	    lower_arm_r,lower_arm_r_length,
	    hand_r,hand_r_length
	  );
}
